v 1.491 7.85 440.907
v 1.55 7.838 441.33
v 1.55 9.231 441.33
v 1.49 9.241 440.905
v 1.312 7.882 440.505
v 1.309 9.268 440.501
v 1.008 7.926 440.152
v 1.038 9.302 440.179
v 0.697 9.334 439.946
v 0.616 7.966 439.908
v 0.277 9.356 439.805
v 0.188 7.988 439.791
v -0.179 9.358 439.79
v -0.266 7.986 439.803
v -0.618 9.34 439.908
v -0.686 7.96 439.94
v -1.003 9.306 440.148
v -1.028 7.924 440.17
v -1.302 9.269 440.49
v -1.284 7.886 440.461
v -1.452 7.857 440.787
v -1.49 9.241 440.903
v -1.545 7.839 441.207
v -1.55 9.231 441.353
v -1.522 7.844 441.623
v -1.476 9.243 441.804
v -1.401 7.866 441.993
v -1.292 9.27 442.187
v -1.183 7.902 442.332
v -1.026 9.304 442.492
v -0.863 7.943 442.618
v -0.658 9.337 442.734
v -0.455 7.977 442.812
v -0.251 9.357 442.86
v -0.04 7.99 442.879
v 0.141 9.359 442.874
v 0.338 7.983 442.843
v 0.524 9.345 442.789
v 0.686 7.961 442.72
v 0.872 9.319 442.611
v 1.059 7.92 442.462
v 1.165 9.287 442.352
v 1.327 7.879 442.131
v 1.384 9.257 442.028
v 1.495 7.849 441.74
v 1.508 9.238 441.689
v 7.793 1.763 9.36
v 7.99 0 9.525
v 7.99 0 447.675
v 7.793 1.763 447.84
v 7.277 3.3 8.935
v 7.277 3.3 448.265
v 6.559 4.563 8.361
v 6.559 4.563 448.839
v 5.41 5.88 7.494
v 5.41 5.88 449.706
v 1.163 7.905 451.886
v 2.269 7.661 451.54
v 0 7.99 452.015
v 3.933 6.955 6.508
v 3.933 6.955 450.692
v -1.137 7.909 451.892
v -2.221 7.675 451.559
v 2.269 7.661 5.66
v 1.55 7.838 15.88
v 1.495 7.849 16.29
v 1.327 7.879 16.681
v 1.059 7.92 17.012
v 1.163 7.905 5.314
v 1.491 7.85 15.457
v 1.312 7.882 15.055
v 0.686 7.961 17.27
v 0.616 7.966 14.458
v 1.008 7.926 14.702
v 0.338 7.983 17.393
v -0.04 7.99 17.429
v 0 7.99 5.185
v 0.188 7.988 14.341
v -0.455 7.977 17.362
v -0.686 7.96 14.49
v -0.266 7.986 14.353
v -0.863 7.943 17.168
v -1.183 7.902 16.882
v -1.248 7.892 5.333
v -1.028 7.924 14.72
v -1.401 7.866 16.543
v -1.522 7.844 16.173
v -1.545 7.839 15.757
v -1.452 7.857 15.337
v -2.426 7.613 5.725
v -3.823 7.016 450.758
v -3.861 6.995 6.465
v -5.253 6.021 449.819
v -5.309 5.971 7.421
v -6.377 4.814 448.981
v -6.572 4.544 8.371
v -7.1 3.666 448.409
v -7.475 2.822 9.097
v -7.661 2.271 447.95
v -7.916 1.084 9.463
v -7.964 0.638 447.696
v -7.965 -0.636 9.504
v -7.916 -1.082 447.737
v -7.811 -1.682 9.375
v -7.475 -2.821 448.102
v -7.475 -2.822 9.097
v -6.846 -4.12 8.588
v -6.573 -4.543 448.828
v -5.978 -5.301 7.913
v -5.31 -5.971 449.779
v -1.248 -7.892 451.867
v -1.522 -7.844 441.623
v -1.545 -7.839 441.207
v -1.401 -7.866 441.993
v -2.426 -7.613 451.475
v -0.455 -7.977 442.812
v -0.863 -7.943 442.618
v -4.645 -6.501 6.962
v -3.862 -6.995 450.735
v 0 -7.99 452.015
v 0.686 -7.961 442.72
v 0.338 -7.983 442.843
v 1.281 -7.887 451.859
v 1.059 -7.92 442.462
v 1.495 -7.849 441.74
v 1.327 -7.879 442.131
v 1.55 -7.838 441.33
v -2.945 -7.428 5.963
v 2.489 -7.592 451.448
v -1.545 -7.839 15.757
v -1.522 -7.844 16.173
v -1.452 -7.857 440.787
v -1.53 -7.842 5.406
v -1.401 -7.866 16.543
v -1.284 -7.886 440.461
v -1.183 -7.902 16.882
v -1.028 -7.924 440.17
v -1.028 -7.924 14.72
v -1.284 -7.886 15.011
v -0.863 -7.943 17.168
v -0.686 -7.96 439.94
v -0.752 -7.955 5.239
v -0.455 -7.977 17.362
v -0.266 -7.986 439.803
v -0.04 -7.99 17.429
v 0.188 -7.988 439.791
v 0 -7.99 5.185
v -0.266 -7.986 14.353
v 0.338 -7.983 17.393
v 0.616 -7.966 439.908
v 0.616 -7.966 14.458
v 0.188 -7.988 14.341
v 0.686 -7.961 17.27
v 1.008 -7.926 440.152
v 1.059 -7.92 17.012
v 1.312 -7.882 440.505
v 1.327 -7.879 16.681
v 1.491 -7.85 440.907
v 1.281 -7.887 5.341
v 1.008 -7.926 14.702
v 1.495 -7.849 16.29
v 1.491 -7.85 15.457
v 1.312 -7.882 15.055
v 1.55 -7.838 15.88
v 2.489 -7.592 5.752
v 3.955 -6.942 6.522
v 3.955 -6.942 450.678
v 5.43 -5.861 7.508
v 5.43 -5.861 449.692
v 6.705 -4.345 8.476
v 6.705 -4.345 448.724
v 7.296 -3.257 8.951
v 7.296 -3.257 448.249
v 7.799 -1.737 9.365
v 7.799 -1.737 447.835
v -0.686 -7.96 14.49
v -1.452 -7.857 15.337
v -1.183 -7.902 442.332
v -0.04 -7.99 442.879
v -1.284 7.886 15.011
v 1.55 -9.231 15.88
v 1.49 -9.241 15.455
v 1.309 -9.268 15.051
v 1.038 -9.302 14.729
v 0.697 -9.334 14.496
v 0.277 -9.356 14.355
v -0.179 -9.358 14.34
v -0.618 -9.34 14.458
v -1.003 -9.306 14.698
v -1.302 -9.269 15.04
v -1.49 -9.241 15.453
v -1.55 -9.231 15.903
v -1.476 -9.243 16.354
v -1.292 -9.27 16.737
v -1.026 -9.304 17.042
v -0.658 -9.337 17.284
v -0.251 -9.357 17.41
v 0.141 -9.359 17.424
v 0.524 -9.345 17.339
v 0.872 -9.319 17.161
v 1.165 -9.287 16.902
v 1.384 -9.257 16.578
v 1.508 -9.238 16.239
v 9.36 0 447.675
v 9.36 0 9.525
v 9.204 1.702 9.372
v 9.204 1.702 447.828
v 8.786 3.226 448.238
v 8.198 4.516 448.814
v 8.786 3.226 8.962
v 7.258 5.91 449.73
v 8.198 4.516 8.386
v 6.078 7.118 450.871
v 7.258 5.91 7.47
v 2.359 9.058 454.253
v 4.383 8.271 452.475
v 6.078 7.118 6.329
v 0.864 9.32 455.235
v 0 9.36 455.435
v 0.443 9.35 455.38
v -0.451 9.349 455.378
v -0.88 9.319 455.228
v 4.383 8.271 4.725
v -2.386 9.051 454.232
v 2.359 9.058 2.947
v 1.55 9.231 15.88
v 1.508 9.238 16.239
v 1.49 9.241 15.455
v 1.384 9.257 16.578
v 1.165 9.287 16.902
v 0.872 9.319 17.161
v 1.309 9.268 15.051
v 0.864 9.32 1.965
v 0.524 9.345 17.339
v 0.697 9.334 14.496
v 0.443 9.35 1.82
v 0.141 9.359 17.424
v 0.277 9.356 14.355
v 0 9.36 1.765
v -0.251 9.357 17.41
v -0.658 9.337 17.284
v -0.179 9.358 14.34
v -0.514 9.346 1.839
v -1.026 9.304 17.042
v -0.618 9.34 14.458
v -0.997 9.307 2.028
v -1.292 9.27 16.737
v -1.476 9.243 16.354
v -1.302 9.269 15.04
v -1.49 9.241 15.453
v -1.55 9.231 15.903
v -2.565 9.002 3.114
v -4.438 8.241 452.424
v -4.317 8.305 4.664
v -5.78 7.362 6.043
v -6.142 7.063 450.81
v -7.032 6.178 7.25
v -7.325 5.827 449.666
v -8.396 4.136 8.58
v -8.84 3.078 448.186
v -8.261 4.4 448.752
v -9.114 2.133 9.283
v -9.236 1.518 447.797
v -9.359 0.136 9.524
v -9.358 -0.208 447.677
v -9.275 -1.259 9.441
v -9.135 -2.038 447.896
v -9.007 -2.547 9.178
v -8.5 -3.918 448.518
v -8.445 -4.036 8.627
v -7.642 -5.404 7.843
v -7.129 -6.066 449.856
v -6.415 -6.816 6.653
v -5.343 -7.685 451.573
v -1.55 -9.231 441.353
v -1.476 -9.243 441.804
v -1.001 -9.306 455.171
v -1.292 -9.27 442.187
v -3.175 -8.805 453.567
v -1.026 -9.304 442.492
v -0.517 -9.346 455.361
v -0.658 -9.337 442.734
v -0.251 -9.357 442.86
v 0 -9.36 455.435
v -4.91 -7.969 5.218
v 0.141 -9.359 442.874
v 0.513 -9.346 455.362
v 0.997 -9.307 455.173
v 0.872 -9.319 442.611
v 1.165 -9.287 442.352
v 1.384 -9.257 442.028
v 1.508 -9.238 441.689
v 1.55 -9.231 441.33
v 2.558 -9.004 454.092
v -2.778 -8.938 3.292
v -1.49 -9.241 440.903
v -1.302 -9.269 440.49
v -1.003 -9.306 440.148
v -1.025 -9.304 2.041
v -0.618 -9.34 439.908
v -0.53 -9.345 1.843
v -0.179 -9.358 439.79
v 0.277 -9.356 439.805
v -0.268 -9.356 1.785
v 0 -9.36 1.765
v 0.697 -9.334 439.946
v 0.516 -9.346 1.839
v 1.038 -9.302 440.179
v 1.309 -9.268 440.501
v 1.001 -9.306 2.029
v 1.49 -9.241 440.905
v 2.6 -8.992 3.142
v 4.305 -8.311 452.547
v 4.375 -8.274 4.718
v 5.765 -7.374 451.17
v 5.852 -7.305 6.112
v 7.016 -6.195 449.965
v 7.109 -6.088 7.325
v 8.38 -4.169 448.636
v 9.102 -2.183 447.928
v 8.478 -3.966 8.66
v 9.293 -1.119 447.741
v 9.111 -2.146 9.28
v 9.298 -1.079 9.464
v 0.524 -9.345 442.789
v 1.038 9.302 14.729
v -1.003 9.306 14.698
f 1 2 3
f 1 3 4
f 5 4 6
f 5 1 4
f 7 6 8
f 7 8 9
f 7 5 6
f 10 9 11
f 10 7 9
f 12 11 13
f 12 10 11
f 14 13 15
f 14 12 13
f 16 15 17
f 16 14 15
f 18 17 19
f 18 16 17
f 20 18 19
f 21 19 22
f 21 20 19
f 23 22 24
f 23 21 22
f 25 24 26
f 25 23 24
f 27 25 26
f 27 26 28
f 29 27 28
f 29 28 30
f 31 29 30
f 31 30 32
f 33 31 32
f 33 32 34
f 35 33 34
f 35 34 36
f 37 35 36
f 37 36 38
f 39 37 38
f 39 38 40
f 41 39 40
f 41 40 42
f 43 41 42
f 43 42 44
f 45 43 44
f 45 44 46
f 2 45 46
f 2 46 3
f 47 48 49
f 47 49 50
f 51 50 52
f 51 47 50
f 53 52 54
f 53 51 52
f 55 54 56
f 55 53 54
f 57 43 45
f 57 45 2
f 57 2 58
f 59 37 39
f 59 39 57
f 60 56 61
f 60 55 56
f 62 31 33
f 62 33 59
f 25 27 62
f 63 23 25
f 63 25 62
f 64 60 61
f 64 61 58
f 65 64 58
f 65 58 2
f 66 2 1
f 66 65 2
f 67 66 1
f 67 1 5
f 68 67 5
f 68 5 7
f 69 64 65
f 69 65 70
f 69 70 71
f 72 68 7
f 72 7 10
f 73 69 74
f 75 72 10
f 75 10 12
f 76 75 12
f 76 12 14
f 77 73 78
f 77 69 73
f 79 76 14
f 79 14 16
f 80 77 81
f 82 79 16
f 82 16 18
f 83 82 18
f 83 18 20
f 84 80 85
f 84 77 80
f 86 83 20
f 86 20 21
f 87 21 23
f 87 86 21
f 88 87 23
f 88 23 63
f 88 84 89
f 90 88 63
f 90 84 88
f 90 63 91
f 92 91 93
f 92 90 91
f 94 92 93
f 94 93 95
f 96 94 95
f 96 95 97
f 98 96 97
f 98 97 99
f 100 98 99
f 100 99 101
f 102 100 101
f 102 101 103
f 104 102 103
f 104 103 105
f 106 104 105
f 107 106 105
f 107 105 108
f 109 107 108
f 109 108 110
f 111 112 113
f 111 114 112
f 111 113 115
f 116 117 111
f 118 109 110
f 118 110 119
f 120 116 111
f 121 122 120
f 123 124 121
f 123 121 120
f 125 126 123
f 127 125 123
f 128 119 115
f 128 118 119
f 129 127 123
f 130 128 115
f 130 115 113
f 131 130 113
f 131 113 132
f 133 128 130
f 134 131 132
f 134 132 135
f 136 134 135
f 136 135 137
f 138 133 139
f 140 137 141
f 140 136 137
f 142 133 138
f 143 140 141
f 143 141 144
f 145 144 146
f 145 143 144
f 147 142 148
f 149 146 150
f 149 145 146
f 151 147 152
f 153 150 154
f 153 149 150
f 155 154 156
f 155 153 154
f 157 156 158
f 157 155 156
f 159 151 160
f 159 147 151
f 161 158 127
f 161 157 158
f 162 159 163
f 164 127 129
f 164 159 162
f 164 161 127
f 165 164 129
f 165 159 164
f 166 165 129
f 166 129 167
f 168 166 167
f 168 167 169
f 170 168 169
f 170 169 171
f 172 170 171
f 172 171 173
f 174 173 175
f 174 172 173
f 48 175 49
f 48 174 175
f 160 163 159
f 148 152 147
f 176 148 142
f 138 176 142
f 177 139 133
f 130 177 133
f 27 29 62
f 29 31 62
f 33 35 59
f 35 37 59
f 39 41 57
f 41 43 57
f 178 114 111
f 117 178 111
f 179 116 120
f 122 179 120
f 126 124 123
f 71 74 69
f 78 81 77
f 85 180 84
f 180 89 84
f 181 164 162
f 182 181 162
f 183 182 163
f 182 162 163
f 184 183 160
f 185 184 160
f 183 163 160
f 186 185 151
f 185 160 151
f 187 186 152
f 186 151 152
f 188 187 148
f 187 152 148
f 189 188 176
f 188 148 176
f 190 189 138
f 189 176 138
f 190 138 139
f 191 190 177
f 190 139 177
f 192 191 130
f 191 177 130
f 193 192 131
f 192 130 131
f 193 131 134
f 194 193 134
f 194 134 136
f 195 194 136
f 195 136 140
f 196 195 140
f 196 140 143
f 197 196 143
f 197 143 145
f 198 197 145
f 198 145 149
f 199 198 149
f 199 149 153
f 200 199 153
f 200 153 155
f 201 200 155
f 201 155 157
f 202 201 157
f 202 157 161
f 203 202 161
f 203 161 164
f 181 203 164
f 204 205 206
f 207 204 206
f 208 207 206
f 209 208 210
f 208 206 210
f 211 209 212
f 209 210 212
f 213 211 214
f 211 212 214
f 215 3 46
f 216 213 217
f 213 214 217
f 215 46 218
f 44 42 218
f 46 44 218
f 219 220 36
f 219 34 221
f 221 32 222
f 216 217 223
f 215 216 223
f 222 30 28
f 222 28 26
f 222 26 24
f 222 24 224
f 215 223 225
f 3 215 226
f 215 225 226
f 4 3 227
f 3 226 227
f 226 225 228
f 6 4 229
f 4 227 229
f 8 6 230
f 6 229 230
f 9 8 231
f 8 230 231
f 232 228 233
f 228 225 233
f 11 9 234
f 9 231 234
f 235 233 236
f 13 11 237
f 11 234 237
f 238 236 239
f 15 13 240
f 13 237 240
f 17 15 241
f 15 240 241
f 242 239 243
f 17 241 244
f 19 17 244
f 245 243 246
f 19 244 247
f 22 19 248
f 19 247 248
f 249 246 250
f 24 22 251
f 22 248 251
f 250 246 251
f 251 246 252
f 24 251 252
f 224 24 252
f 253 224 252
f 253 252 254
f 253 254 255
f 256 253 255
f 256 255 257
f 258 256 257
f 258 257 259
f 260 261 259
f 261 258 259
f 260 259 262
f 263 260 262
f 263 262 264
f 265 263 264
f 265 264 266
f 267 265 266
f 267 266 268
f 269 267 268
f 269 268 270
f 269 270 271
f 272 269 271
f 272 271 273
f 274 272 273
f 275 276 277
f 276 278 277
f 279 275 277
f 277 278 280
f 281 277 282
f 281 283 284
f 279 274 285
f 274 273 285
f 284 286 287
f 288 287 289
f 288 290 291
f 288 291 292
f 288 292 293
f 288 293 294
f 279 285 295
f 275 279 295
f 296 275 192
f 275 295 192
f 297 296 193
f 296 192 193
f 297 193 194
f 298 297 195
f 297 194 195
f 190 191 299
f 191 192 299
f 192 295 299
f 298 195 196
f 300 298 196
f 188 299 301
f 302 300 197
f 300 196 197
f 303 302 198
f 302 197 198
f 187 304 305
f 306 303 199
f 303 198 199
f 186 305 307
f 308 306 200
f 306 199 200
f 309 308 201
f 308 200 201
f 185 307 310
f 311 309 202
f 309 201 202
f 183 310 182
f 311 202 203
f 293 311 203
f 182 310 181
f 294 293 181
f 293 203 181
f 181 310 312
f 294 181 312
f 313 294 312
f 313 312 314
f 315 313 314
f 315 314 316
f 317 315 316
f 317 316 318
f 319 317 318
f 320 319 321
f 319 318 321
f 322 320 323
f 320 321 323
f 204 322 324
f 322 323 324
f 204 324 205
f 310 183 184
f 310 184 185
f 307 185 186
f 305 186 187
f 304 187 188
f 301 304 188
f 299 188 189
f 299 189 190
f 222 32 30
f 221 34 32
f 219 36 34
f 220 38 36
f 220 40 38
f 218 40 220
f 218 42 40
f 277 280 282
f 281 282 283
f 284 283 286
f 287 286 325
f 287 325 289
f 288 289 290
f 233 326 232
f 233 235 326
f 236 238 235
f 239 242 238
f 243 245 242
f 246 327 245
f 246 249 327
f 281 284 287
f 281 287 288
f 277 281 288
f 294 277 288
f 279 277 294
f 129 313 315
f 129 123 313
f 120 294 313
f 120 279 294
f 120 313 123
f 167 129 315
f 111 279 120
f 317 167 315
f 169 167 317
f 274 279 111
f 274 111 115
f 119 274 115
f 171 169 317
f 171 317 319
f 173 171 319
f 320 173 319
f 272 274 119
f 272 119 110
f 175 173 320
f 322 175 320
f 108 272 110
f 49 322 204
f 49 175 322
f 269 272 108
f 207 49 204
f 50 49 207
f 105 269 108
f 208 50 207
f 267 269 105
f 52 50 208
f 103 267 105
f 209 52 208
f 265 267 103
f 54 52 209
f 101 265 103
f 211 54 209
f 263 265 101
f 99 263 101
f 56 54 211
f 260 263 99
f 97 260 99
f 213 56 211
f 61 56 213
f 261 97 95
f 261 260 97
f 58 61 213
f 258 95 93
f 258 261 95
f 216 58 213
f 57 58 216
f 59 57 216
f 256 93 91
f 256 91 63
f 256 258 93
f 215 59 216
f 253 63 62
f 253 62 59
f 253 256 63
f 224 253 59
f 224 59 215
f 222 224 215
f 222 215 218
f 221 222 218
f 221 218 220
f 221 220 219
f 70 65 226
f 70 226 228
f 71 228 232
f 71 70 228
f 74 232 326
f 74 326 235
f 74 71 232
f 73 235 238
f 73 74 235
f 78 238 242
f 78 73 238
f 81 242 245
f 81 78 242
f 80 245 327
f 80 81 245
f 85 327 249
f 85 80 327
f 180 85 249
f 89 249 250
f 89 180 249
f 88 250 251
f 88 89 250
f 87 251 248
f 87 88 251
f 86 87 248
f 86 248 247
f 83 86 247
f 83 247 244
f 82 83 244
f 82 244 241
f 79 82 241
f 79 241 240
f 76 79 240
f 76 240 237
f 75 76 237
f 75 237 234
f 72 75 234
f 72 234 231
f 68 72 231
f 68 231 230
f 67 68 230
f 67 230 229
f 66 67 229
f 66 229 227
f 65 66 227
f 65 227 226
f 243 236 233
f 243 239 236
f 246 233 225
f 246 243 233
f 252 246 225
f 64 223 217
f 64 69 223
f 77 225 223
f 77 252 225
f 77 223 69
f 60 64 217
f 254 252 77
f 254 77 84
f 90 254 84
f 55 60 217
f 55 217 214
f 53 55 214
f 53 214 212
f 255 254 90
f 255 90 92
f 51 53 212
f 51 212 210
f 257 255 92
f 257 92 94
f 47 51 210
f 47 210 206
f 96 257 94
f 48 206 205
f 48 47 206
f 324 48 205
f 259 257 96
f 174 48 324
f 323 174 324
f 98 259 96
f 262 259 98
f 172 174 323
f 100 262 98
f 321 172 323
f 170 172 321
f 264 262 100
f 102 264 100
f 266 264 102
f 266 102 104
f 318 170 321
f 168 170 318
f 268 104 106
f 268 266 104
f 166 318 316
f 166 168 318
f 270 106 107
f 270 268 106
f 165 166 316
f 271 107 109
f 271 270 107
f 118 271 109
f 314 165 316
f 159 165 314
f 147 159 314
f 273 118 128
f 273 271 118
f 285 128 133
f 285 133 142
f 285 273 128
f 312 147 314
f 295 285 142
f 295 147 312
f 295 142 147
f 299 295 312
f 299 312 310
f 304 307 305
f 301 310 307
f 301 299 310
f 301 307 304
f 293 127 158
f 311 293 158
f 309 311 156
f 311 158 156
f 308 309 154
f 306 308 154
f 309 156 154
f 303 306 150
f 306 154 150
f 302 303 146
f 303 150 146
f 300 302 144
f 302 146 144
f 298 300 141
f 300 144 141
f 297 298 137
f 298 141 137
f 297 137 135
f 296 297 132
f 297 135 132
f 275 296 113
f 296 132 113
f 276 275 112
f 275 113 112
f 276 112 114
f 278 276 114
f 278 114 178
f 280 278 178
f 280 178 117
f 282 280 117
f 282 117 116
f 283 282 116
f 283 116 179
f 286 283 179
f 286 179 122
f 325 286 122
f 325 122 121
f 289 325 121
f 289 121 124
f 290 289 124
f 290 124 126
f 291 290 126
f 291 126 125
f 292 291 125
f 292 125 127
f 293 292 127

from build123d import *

# Parameters (mm, degrees)
SKETCH1_R               = 9.36
SKETCH1_R_2             = 7.99
EXTRUDE1_DEPTH          = 457.2
SKETCH2_R               = 9.525
CUT_EXTRUDE1_DEPTH      = 10.36
CUT_EXTRUDE1_DEPTH_BACK = 10.36
SKETCH3_R               = 9.525
CUT_EXTRUDE2_DEPTH      = 10.3600001
CUT_EXTRUDE2_DEPTH_BACK = 10.3600001
SKETCH5_R               = 1.55
CUT_EXTRUDE3_DEPTH      = 10.3600001
CUT_EXTRUDE3_DEPTH_BACK = 10.3600001


with BuildPart() as part:
    # Sketch1 → Extrude1 (new body)
    with BuildSketch(Plane.XY):
        Circle(SKETCH1_R)
        Circle(SKETCH1_R_2, mode=Mode.SUBTRACT)
    extrude(amount=EXTRUDE1_DEPTH)

    # Sketch2 → Cut-Extrude1 (cut, two sides)
    with BuildSketch(Plane(origin=(0, 0, 0), x_dir=(0, 0, -1), z_dir=(1, 0, 0))) as cut_extrude1_sk:
        Circle(SKETCH2_R)
    extrude(amount=CUT_EXTRUDE1_DEPTH, mode=Mode.SUBTRACT)
    extrude(cut_extrude1_sk.sketch, amount=-CUT_EXTRUDE1_DEPTH_BACK, mode=Mode.SUBTRACT)

    # Sketch3 → Cut-Extrude2 (cut, two sides)
    with BuildSketch(Plane(origin=(0, 0, 0), x_dir=(0, 0, -1), z_dir=(1, 0, 0))) as cut_extrude2_sk:
        with Locations((-457.2, 0)):
            Circle(SKETCH3_R)
    extrude(amount=CUT_EXTRUDE2_DEPTH, mode=Mode.SUBTRACT)
    extrude(cut_extrude2_sk.sketch, amount=-CUT_EXTRUDE2_DEPTH_BACK, mode=Mode.SUBTRACT)

    # Sketch5 → Cut-Extrude3 (cut, two sides)
    with BuildSketch(Plane(origin=(0, 0, 0), x_dir=(1, 0, 0), z_dir=(0, 1, 0))) as cut_extrude3_sk:
        with Locations((0, -441.33)):
            Circle(SKETCH5_R)
        with Locations((0, -15.88)):
            Circle(SKETCH5_R)
    extrude(amount=CUT_EXTRUDE3_DEPTH, mode=Mode.SUBTRACT)
    extrude(cut_extrude3_sk.sketch, amount=-CUT_EXTRUDE3_DEPTH_BACK, mode=Mode.SUBTRACT)


solid = part.part
